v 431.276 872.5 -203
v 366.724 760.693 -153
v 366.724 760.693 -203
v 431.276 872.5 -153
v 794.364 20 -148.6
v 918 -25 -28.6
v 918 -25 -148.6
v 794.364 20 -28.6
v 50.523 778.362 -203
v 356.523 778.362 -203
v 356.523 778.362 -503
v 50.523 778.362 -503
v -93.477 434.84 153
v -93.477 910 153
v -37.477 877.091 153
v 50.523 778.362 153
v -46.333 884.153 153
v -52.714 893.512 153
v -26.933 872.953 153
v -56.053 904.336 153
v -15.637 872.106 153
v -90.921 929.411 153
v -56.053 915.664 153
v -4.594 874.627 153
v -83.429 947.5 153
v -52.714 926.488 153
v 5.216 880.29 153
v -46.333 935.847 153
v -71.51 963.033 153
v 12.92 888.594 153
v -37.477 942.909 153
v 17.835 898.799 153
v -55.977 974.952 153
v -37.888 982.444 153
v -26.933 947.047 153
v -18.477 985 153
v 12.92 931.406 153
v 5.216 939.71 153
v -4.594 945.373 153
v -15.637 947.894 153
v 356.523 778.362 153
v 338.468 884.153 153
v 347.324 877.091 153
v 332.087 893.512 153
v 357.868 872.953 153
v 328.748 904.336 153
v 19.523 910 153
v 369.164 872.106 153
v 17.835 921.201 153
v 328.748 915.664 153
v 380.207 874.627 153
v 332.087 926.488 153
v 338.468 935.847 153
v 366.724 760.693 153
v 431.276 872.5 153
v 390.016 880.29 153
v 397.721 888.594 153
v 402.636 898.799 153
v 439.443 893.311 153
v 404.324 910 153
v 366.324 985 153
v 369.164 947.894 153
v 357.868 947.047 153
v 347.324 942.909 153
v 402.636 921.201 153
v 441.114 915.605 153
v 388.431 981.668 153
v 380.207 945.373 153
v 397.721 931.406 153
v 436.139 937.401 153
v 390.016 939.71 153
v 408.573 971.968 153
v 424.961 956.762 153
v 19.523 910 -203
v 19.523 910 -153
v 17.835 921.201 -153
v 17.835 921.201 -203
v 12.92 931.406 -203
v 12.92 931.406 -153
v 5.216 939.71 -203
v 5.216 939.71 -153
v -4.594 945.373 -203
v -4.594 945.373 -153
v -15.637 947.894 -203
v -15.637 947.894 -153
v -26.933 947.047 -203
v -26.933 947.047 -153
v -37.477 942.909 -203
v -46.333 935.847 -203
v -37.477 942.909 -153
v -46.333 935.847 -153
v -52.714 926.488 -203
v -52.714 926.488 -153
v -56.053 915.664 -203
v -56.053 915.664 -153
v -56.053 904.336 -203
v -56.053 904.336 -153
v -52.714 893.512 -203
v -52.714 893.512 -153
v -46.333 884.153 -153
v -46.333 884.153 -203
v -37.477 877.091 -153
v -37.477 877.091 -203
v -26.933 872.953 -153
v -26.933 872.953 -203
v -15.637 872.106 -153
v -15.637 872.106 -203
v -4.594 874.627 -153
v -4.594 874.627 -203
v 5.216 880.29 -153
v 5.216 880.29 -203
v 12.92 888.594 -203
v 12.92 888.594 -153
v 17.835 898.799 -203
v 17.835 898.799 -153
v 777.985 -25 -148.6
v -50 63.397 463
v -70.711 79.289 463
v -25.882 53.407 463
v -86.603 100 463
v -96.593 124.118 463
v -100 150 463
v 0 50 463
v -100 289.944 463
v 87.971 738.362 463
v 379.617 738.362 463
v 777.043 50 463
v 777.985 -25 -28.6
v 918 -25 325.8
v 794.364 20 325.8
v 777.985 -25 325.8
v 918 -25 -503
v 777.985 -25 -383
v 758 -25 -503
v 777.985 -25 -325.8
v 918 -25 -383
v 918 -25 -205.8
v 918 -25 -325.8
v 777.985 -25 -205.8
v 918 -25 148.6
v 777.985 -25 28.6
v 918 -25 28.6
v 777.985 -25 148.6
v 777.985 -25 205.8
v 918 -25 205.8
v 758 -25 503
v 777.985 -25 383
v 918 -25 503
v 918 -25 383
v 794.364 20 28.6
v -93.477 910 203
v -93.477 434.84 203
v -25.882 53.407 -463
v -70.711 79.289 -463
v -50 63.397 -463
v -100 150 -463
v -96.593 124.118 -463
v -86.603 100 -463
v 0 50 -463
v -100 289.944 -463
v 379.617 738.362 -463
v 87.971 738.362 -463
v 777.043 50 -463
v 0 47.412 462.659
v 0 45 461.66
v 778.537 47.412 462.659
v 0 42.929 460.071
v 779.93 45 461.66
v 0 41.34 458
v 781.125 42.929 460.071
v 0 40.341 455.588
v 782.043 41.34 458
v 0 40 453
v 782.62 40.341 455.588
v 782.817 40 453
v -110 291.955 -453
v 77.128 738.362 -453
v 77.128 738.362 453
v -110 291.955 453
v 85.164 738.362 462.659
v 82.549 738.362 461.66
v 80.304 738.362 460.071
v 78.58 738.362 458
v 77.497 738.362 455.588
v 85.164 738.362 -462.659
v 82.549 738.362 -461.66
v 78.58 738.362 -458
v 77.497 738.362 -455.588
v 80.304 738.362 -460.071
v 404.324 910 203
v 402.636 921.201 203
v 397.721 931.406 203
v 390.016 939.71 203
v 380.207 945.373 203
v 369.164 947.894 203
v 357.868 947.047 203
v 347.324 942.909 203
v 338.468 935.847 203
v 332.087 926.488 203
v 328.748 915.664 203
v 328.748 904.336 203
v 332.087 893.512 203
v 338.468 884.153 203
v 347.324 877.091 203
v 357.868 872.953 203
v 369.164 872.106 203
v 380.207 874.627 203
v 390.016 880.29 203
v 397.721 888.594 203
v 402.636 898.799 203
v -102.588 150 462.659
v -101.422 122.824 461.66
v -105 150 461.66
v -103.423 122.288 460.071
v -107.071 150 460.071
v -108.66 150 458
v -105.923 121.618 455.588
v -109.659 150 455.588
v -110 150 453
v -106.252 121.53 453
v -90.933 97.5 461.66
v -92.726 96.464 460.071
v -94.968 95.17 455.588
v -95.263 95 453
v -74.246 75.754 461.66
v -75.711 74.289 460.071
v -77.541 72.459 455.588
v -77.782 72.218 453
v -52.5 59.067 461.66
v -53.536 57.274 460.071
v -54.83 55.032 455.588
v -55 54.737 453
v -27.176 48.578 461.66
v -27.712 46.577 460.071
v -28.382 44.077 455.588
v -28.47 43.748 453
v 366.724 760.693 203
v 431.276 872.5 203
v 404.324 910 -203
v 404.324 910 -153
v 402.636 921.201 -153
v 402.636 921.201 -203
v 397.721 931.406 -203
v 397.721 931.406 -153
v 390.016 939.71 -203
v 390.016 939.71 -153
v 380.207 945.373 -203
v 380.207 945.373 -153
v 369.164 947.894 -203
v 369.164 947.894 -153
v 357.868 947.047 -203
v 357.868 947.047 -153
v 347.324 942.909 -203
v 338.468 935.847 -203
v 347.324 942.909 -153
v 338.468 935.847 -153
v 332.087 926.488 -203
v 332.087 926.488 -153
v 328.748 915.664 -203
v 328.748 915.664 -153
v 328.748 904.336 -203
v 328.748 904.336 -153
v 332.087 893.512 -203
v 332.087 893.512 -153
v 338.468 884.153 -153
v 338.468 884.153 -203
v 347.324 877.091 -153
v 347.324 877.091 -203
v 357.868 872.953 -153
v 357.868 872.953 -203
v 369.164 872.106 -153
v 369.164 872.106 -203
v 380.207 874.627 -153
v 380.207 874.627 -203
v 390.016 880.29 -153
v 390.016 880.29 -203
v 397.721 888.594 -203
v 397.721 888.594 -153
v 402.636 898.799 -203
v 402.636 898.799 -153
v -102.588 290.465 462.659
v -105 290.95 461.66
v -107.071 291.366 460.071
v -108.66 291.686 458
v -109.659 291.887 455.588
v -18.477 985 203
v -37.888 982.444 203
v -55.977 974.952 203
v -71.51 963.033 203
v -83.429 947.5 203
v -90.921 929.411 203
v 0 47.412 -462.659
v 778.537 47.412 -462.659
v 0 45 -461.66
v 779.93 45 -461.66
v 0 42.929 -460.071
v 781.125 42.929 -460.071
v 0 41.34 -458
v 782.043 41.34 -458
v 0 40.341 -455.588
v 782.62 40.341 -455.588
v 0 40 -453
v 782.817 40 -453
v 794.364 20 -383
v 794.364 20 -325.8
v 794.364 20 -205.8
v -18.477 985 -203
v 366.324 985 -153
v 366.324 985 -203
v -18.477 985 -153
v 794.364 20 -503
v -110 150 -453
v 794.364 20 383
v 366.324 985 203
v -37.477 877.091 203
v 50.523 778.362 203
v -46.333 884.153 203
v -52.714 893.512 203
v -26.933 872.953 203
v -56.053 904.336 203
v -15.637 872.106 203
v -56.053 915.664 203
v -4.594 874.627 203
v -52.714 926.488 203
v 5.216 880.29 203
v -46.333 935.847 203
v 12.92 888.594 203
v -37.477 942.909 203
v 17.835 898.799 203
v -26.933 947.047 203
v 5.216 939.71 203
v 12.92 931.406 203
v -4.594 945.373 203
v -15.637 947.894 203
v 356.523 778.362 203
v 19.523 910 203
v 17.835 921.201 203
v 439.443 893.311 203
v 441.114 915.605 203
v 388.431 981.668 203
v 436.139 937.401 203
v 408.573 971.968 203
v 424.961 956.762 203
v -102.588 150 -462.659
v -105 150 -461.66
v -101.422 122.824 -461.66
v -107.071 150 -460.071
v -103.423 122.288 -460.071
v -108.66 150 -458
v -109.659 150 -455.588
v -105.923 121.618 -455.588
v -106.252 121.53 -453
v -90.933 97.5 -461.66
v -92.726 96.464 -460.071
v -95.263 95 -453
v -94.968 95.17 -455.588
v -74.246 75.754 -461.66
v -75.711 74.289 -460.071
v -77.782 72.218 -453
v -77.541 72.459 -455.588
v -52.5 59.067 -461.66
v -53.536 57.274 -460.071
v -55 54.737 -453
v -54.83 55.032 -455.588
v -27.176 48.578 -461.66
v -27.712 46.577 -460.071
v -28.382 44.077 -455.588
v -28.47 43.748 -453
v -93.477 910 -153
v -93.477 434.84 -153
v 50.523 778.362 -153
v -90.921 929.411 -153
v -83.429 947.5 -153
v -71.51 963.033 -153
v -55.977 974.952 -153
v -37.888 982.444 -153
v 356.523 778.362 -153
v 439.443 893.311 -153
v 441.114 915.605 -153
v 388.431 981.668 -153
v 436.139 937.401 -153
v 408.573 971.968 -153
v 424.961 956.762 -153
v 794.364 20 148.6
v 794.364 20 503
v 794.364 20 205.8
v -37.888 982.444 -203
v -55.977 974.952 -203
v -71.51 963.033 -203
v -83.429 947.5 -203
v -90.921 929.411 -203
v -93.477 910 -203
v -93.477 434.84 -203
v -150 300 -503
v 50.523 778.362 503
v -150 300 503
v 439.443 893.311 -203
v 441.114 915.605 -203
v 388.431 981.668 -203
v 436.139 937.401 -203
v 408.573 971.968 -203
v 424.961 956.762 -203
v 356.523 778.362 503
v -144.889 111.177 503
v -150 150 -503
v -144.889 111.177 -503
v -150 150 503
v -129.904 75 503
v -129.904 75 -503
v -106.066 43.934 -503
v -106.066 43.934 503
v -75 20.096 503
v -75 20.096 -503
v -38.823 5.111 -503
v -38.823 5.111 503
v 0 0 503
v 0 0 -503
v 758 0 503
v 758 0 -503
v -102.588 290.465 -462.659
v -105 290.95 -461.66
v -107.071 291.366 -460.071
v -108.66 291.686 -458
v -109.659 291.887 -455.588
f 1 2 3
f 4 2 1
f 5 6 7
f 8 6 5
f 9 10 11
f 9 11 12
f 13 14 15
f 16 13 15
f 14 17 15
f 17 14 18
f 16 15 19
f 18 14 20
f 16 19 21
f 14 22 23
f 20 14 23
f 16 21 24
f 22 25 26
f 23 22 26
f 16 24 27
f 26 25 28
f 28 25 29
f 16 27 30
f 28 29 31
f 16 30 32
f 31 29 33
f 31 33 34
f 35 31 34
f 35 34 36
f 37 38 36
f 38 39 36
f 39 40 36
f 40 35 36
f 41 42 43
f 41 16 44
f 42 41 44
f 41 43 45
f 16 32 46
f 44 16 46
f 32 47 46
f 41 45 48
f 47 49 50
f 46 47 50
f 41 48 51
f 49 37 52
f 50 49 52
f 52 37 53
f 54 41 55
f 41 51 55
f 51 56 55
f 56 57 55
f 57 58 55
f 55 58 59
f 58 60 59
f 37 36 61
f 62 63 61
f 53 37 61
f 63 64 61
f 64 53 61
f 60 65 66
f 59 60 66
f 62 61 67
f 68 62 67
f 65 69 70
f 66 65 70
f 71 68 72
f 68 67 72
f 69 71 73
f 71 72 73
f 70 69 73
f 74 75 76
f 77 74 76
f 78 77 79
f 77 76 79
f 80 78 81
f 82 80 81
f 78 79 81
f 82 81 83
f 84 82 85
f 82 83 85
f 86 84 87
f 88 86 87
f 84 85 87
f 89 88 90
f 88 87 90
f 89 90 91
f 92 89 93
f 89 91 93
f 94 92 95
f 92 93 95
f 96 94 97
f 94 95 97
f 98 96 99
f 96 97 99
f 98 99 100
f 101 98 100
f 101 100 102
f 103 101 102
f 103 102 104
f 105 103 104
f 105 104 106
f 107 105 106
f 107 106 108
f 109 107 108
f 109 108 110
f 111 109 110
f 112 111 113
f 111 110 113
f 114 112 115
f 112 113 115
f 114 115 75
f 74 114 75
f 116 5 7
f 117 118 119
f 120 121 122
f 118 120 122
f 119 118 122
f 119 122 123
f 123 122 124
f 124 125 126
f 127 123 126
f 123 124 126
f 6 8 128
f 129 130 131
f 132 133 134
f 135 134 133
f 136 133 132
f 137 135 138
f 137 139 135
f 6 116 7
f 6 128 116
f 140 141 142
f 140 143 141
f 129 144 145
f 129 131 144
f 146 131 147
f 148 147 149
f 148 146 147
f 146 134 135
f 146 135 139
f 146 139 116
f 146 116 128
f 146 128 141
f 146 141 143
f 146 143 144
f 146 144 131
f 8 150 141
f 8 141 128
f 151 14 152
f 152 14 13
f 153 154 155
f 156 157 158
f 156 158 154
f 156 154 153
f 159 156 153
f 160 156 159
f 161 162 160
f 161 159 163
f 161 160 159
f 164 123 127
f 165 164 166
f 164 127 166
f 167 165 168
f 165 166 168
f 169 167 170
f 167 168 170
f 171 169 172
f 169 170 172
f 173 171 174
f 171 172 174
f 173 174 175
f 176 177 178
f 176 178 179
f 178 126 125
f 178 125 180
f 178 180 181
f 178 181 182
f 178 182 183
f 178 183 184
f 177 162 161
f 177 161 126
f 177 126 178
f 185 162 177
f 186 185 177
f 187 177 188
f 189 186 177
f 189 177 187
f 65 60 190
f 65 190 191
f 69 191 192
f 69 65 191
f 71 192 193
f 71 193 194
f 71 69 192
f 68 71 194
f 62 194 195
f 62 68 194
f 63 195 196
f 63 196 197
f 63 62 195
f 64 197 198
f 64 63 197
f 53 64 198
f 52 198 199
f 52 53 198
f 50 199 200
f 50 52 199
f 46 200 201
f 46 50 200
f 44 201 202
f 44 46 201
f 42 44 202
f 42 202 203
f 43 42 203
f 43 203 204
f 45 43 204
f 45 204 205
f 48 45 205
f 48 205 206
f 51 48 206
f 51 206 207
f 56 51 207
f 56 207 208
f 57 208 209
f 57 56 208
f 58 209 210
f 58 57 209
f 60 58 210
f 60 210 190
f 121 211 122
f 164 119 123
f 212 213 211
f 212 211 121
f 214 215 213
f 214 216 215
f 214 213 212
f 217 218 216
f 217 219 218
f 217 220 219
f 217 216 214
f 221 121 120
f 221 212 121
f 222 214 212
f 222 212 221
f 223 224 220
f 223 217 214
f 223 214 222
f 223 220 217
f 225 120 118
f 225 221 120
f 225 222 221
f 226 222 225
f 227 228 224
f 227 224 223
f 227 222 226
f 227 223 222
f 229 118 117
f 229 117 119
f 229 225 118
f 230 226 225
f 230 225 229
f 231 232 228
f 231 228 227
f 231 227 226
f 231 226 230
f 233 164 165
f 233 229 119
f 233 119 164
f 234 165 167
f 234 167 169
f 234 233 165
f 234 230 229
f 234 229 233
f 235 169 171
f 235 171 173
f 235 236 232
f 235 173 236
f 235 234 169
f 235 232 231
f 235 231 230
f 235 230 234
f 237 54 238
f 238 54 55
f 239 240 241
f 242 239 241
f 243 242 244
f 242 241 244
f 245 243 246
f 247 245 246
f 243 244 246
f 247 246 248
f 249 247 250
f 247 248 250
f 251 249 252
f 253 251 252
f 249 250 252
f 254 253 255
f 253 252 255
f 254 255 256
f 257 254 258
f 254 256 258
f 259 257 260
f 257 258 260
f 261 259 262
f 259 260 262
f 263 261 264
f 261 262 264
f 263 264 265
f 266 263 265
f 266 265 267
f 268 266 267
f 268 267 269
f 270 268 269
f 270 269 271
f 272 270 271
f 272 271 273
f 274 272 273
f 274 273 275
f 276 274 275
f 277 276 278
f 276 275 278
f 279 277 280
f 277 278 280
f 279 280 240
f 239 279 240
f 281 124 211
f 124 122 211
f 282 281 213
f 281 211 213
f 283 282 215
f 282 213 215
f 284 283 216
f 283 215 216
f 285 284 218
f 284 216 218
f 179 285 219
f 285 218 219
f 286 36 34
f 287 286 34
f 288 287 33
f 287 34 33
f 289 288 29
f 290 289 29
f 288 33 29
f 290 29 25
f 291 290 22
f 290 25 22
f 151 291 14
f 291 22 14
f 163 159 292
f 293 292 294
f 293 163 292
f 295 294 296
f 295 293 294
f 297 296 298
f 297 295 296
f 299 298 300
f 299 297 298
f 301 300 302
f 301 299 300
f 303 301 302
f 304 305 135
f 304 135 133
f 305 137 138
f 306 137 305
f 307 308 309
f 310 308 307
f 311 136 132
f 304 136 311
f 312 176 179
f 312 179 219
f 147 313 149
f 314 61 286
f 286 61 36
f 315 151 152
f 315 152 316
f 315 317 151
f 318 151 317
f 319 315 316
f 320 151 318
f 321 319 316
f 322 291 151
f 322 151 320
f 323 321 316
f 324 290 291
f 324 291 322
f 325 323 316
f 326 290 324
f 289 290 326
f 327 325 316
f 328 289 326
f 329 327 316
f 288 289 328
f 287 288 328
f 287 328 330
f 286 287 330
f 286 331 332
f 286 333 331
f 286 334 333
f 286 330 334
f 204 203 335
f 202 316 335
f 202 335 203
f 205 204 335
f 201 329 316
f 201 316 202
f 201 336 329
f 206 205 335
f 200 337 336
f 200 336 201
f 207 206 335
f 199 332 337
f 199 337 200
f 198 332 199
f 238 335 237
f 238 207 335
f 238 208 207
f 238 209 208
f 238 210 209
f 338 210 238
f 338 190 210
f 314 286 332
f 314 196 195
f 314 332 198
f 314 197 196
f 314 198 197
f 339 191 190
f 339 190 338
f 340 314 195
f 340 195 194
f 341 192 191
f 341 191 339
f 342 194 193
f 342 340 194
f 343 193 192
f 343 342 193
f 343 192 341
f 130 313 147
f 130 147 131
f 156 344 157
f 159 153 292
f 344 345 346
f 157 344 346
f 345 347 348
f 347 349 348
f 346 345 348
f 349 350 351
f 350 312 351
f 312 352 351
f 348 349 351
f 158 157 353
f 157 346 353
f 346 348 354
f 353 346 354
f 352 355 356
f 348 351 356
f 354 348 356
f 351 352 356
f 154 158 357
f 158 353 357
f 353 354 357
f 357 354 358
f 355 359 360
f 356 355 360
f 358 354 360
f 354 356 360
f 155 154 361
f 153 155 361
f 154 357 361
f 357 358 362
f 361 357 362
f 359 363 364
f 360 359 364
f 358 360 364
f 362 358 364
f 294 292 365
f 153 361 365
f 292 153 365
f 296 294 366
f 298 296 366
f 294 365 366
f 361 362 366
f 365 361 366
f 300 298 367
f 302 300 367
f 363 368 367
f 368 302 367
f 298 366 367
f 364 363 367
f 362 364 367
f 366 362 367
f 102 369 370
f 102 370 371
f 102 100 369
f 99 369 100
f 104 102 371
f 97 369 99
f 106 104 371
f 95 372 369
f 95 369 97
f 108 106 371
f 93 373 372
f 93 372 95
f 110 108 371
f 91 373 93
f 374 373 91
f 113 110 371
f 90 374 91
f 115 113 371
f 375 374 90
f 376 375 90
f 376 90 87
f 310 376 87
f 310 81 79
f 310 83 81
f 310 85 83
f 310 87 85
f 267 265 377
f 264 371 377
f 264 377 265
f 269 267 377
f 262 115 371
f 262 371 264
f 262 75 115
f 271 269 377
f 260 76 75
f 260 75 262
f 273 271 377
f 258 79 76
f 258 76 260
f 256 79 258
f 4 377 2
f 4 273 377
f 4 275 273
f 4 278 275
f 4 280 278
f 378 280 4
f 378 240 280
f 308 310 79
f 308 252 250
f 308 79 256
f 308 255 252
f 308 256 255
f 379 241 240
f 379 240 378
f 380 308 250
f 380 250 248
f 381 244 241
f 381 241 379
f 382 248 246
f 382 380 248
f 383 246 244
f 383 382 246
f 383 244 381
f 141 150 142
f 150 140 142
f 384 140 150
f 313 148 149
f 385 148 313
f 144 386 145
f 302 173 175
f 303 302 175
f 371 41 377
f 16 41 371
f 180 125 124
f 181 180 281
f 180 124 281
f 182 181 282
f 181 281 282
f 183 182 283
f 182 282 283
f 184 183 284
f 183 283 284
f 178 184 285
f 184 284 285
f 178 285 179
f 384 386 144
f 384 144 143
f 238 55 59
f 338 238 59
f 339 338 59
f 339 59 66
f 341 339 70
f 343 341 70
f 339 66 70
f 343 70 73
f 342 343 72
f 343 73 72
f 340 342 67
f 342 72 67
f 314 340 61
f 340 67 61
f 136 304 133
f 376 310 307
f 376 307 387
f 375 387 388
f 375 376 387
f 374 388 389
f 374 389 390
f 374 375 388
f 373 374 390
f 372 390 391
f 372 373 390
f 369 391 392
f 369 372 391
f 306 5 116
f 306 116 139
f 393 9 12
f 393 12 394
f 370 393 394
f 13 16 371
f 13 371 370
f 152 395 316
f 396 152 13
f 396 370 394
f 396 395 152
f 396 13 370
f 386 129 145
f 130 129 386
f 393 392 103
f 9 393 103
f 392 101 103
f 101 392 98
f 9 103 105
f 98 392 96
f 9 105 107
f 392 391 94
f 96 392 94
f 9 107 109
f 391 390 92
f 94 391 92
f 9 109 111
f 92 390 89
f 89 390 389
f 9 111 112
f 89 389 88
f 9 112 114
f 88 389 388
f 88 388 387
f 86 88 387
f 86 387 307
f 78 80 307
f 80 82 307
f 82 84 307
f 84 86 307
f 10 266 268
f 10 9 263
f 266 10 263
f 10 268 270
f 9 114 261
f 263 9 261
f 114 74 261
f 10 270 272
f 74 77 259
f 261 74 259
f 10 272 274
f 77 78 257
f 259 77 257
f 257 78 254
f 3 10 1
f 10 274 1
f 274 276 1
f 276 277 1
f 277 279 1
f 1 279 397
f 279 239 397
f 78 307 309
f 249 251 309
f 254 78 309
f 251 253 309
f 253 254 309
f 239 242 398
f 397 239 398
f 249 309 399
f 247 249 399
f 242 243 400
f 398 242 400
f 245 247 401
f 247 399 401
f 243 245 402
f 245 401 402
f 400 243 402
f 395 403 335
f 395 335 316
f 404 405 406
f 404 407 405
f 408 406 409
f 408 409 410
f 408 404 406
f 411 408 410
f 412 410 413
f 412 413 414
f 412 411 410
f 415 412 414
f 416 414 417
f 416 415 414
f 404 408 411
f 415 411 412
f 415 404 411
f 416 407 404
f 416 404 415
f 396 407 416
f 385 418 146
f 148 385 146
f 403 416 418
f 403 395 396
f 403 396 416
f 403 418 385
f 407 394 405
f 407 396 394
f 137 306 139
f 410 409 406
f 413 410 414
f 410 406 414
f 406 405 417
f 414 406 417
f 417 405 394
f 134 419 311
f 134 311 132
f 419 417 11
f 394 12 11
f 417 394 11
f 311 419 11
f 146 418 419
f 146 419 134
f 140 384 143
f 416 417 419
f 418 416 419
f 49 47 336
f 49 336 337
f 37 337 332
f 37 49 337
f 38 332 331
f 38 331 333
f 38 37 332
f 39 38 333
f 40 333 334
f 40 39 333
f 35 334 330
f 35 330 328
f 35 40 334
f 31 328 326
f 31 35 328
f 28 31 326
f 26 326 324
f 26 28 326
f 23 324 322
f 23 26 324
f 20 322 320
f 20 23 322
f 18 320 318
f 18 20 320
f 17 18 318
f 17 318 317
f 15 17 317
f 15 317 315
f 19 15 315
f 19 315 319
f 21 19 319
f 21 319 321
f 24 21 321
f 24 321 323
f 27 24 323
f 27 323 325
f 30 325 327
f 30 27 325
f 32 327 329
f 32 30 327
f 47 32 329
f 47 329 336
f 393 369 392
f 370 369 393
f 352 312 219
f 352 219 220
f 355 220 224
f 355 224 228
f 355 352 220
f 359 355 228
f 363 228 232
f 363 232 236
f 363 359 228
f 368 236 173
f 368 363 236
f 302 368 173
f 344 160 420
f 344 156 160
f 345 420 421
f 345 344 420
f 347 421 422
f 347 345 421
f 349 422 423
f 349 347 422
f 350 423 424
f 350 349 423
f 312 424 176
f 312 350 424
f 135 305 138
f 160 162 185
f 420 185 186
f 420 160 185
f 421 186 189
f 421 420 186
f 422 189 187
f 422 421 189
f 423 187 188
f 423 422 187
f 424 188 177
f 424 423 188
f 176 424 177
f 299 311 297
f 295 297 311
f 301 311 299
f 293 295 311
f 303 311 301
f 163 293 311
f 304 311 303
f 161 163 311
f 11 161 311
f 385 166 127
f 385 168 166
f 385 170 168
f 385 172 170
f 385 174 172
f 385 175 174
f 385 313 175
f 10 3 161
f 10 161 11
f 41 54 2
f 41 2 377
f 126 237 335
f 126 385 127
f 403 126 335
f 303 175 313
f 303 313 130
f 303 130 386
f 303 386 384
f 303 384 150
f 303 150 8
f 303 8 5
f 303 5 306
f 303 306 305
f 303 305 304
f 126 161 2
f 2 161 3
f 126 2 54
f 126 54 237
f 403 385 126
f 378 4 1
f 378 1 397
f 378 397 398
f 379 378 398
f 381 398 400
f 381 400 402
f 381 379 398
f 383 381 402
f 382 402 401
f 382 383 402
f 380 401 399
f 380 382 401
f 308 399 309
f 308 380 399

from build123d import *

# Parameters (mm, degrees)
BOSS_EXTRUDE2_DEPTH = 503
SHELL1_START        = -463
SHELL1_DEPTH        = 926
FILLET1_R           = 10
SKETCH8_W           = 131.571198008
SKETCH8_H           = 57.2
CUT_EXTRUDE5_DEPTH  = 1006
LPATTERN1_COUNT     = 5
LPATTERN1_PITCH     = 177.2
BOSS_EXTRUDE4_START = -350
SKETCH12_R          = 38
BOSS_EXTRUDE4_DEPTH = 50


# Read off the part's stored shape, not the designer's step: Shell1
with BuildPart() as part:
    # Sketch1 → Boss-Extrude2 (new, symmetric)
    with BuildSketch(Plane.XY):
        with BuildLine():
            ThreePointArc((-150, 150), (-106.066017178, 43.933982822), (0, 0))
            Line((0, 0), (758, 0))
            Line((758, 0), (758, -25))
            Line((758, -25), (777.984855583, -25))
            Line((777.984855583, -25), (794.363516125, 20))
            Line((794.363516125, 20), (356.523002694, 778.362014874))
            Line((356.523002694, 778.362014874), (50.523002694, 778.362014874))
            Line((50.523002694, 778.362014874), (-150, 300))
            Line((-150, 300), (-150, 150))
        make_face()
        Polygon((794.363516125, 20), (777.984855583, -25), (918, -25), align=None)
    extrude(amount=BOSS_EXTRUDE2_DEPTH, both=True)

    # Shell1 outline → Shell1 (cut)
    with BuildSketch(Plane.XY.offset(SHELL1_START)):
        with BuildLine():
            ThreePointArc((-110, 150), (-77.781745931, 72.218254069), (0, 40))
            Line((0, 40), (782.816510741, 40))
            Line((782.816510741, 40), (379.617013461, 738.362014874))
            Line((379.617013461, 738.362014874), (77.127737155, 738.362014874))
            Line((77.127737155, 738.362014874), (-110, 291.955367349))
            Line((-110, 291.955367349), (-110, 150))
        make_face()
    extrude(amount=SHELL1_DEPTH, mode=Mode.SUBTRACT)

    # Fillet1
    fillet1_edges = [part.edges().sort_by_distance(p)[0] for p in [
        (-77.781745931, 72.218254069, 463),
        (391.408255371, 40, -463),
        (-16.436131422, 515.158691112, 463),
        (-110, 220.977683675, 463),
        (391.408255371, 40, 463),
        (-77.781745931, 72.218254069, -463),
        (-110, 220.977683675, -463),
        (-16.436131422, 515.158691112, -463),
    ]]
    fillet(fillet1_edges, radius=FILLET1_R)

    # Sketch8 → Cut-Extrude5 (cut)
    with BuildSketch(Plane(origin=(99.350755487, 272.963957307, 0), x_dir=(0.9396926207859106, -0.3420201433256628, 0), z_dir=(0.34202014332566283, 0.9396926207859106, 0))):
        with Locations((805.402730461, 354.4)):
            Rectangle(SKETCH8_W, SKETCH8_H)
    cut_extrude5 = extrude(amount=-CUT_EXTRUDE5_DEPTH, mode=Mode.SUBTRACT)

    # LPattern1: Cut-Extrude5 ×5
    with Locations(*[(0, 0, i * LPATTERN1_PITCH) for i in range(1, LPATTERN1_COUNT)]):
        add(cut_extrude5, mode=Mode.SUBTRACT)

    # Sketch12 → Boss-Extrude4 (add)
    with BuildSketch(Plane.XY.offset(503).offset(BOSS_EXTRUDE4_START)):
        with BuildLine():
            Line((366.724091876, 760.693210118), (431.275772112, 872.5))
            ThreePointArc((431.275772112, 872.5), (431.275772112, 947.5), (366.323866828, 985))
            Line((366.323866828, 985), (-18.476997306, 985))
            ThreePointArc((-18.476997306, 985), (-71.510005895, 963.033008589), (-93.476997306, 910))
            Line((-93.476997306, 910), (-93.476997306, 434.839679698))
            Line((-93.476997306, 434.839679698), (50.523002694, 778.362014874))
            Line((50.523002694, 778.362014874), (356.523002694, 778.362014874))
            Line((356.523002694, 778.362014874), (366.724091876, 760.693210118))
        make_face()
        with Locations((-18.476997306, 910)):
            Circle(SKETCH12_R, mode=Mode.SUBTRACT)
        with Locations((366.323866828, 910)):
            Circle(SKETCH12_R, mode=Mode.SUBTRACT)
    boss_extrude4 = extrude(amount=BOSS_EXTRUDE4_DEPTH)

    # Mirror2: Boss-Extrude4 across plane
    add(boss_extrude4.mirror(Plane.XY))


solid = part.part
